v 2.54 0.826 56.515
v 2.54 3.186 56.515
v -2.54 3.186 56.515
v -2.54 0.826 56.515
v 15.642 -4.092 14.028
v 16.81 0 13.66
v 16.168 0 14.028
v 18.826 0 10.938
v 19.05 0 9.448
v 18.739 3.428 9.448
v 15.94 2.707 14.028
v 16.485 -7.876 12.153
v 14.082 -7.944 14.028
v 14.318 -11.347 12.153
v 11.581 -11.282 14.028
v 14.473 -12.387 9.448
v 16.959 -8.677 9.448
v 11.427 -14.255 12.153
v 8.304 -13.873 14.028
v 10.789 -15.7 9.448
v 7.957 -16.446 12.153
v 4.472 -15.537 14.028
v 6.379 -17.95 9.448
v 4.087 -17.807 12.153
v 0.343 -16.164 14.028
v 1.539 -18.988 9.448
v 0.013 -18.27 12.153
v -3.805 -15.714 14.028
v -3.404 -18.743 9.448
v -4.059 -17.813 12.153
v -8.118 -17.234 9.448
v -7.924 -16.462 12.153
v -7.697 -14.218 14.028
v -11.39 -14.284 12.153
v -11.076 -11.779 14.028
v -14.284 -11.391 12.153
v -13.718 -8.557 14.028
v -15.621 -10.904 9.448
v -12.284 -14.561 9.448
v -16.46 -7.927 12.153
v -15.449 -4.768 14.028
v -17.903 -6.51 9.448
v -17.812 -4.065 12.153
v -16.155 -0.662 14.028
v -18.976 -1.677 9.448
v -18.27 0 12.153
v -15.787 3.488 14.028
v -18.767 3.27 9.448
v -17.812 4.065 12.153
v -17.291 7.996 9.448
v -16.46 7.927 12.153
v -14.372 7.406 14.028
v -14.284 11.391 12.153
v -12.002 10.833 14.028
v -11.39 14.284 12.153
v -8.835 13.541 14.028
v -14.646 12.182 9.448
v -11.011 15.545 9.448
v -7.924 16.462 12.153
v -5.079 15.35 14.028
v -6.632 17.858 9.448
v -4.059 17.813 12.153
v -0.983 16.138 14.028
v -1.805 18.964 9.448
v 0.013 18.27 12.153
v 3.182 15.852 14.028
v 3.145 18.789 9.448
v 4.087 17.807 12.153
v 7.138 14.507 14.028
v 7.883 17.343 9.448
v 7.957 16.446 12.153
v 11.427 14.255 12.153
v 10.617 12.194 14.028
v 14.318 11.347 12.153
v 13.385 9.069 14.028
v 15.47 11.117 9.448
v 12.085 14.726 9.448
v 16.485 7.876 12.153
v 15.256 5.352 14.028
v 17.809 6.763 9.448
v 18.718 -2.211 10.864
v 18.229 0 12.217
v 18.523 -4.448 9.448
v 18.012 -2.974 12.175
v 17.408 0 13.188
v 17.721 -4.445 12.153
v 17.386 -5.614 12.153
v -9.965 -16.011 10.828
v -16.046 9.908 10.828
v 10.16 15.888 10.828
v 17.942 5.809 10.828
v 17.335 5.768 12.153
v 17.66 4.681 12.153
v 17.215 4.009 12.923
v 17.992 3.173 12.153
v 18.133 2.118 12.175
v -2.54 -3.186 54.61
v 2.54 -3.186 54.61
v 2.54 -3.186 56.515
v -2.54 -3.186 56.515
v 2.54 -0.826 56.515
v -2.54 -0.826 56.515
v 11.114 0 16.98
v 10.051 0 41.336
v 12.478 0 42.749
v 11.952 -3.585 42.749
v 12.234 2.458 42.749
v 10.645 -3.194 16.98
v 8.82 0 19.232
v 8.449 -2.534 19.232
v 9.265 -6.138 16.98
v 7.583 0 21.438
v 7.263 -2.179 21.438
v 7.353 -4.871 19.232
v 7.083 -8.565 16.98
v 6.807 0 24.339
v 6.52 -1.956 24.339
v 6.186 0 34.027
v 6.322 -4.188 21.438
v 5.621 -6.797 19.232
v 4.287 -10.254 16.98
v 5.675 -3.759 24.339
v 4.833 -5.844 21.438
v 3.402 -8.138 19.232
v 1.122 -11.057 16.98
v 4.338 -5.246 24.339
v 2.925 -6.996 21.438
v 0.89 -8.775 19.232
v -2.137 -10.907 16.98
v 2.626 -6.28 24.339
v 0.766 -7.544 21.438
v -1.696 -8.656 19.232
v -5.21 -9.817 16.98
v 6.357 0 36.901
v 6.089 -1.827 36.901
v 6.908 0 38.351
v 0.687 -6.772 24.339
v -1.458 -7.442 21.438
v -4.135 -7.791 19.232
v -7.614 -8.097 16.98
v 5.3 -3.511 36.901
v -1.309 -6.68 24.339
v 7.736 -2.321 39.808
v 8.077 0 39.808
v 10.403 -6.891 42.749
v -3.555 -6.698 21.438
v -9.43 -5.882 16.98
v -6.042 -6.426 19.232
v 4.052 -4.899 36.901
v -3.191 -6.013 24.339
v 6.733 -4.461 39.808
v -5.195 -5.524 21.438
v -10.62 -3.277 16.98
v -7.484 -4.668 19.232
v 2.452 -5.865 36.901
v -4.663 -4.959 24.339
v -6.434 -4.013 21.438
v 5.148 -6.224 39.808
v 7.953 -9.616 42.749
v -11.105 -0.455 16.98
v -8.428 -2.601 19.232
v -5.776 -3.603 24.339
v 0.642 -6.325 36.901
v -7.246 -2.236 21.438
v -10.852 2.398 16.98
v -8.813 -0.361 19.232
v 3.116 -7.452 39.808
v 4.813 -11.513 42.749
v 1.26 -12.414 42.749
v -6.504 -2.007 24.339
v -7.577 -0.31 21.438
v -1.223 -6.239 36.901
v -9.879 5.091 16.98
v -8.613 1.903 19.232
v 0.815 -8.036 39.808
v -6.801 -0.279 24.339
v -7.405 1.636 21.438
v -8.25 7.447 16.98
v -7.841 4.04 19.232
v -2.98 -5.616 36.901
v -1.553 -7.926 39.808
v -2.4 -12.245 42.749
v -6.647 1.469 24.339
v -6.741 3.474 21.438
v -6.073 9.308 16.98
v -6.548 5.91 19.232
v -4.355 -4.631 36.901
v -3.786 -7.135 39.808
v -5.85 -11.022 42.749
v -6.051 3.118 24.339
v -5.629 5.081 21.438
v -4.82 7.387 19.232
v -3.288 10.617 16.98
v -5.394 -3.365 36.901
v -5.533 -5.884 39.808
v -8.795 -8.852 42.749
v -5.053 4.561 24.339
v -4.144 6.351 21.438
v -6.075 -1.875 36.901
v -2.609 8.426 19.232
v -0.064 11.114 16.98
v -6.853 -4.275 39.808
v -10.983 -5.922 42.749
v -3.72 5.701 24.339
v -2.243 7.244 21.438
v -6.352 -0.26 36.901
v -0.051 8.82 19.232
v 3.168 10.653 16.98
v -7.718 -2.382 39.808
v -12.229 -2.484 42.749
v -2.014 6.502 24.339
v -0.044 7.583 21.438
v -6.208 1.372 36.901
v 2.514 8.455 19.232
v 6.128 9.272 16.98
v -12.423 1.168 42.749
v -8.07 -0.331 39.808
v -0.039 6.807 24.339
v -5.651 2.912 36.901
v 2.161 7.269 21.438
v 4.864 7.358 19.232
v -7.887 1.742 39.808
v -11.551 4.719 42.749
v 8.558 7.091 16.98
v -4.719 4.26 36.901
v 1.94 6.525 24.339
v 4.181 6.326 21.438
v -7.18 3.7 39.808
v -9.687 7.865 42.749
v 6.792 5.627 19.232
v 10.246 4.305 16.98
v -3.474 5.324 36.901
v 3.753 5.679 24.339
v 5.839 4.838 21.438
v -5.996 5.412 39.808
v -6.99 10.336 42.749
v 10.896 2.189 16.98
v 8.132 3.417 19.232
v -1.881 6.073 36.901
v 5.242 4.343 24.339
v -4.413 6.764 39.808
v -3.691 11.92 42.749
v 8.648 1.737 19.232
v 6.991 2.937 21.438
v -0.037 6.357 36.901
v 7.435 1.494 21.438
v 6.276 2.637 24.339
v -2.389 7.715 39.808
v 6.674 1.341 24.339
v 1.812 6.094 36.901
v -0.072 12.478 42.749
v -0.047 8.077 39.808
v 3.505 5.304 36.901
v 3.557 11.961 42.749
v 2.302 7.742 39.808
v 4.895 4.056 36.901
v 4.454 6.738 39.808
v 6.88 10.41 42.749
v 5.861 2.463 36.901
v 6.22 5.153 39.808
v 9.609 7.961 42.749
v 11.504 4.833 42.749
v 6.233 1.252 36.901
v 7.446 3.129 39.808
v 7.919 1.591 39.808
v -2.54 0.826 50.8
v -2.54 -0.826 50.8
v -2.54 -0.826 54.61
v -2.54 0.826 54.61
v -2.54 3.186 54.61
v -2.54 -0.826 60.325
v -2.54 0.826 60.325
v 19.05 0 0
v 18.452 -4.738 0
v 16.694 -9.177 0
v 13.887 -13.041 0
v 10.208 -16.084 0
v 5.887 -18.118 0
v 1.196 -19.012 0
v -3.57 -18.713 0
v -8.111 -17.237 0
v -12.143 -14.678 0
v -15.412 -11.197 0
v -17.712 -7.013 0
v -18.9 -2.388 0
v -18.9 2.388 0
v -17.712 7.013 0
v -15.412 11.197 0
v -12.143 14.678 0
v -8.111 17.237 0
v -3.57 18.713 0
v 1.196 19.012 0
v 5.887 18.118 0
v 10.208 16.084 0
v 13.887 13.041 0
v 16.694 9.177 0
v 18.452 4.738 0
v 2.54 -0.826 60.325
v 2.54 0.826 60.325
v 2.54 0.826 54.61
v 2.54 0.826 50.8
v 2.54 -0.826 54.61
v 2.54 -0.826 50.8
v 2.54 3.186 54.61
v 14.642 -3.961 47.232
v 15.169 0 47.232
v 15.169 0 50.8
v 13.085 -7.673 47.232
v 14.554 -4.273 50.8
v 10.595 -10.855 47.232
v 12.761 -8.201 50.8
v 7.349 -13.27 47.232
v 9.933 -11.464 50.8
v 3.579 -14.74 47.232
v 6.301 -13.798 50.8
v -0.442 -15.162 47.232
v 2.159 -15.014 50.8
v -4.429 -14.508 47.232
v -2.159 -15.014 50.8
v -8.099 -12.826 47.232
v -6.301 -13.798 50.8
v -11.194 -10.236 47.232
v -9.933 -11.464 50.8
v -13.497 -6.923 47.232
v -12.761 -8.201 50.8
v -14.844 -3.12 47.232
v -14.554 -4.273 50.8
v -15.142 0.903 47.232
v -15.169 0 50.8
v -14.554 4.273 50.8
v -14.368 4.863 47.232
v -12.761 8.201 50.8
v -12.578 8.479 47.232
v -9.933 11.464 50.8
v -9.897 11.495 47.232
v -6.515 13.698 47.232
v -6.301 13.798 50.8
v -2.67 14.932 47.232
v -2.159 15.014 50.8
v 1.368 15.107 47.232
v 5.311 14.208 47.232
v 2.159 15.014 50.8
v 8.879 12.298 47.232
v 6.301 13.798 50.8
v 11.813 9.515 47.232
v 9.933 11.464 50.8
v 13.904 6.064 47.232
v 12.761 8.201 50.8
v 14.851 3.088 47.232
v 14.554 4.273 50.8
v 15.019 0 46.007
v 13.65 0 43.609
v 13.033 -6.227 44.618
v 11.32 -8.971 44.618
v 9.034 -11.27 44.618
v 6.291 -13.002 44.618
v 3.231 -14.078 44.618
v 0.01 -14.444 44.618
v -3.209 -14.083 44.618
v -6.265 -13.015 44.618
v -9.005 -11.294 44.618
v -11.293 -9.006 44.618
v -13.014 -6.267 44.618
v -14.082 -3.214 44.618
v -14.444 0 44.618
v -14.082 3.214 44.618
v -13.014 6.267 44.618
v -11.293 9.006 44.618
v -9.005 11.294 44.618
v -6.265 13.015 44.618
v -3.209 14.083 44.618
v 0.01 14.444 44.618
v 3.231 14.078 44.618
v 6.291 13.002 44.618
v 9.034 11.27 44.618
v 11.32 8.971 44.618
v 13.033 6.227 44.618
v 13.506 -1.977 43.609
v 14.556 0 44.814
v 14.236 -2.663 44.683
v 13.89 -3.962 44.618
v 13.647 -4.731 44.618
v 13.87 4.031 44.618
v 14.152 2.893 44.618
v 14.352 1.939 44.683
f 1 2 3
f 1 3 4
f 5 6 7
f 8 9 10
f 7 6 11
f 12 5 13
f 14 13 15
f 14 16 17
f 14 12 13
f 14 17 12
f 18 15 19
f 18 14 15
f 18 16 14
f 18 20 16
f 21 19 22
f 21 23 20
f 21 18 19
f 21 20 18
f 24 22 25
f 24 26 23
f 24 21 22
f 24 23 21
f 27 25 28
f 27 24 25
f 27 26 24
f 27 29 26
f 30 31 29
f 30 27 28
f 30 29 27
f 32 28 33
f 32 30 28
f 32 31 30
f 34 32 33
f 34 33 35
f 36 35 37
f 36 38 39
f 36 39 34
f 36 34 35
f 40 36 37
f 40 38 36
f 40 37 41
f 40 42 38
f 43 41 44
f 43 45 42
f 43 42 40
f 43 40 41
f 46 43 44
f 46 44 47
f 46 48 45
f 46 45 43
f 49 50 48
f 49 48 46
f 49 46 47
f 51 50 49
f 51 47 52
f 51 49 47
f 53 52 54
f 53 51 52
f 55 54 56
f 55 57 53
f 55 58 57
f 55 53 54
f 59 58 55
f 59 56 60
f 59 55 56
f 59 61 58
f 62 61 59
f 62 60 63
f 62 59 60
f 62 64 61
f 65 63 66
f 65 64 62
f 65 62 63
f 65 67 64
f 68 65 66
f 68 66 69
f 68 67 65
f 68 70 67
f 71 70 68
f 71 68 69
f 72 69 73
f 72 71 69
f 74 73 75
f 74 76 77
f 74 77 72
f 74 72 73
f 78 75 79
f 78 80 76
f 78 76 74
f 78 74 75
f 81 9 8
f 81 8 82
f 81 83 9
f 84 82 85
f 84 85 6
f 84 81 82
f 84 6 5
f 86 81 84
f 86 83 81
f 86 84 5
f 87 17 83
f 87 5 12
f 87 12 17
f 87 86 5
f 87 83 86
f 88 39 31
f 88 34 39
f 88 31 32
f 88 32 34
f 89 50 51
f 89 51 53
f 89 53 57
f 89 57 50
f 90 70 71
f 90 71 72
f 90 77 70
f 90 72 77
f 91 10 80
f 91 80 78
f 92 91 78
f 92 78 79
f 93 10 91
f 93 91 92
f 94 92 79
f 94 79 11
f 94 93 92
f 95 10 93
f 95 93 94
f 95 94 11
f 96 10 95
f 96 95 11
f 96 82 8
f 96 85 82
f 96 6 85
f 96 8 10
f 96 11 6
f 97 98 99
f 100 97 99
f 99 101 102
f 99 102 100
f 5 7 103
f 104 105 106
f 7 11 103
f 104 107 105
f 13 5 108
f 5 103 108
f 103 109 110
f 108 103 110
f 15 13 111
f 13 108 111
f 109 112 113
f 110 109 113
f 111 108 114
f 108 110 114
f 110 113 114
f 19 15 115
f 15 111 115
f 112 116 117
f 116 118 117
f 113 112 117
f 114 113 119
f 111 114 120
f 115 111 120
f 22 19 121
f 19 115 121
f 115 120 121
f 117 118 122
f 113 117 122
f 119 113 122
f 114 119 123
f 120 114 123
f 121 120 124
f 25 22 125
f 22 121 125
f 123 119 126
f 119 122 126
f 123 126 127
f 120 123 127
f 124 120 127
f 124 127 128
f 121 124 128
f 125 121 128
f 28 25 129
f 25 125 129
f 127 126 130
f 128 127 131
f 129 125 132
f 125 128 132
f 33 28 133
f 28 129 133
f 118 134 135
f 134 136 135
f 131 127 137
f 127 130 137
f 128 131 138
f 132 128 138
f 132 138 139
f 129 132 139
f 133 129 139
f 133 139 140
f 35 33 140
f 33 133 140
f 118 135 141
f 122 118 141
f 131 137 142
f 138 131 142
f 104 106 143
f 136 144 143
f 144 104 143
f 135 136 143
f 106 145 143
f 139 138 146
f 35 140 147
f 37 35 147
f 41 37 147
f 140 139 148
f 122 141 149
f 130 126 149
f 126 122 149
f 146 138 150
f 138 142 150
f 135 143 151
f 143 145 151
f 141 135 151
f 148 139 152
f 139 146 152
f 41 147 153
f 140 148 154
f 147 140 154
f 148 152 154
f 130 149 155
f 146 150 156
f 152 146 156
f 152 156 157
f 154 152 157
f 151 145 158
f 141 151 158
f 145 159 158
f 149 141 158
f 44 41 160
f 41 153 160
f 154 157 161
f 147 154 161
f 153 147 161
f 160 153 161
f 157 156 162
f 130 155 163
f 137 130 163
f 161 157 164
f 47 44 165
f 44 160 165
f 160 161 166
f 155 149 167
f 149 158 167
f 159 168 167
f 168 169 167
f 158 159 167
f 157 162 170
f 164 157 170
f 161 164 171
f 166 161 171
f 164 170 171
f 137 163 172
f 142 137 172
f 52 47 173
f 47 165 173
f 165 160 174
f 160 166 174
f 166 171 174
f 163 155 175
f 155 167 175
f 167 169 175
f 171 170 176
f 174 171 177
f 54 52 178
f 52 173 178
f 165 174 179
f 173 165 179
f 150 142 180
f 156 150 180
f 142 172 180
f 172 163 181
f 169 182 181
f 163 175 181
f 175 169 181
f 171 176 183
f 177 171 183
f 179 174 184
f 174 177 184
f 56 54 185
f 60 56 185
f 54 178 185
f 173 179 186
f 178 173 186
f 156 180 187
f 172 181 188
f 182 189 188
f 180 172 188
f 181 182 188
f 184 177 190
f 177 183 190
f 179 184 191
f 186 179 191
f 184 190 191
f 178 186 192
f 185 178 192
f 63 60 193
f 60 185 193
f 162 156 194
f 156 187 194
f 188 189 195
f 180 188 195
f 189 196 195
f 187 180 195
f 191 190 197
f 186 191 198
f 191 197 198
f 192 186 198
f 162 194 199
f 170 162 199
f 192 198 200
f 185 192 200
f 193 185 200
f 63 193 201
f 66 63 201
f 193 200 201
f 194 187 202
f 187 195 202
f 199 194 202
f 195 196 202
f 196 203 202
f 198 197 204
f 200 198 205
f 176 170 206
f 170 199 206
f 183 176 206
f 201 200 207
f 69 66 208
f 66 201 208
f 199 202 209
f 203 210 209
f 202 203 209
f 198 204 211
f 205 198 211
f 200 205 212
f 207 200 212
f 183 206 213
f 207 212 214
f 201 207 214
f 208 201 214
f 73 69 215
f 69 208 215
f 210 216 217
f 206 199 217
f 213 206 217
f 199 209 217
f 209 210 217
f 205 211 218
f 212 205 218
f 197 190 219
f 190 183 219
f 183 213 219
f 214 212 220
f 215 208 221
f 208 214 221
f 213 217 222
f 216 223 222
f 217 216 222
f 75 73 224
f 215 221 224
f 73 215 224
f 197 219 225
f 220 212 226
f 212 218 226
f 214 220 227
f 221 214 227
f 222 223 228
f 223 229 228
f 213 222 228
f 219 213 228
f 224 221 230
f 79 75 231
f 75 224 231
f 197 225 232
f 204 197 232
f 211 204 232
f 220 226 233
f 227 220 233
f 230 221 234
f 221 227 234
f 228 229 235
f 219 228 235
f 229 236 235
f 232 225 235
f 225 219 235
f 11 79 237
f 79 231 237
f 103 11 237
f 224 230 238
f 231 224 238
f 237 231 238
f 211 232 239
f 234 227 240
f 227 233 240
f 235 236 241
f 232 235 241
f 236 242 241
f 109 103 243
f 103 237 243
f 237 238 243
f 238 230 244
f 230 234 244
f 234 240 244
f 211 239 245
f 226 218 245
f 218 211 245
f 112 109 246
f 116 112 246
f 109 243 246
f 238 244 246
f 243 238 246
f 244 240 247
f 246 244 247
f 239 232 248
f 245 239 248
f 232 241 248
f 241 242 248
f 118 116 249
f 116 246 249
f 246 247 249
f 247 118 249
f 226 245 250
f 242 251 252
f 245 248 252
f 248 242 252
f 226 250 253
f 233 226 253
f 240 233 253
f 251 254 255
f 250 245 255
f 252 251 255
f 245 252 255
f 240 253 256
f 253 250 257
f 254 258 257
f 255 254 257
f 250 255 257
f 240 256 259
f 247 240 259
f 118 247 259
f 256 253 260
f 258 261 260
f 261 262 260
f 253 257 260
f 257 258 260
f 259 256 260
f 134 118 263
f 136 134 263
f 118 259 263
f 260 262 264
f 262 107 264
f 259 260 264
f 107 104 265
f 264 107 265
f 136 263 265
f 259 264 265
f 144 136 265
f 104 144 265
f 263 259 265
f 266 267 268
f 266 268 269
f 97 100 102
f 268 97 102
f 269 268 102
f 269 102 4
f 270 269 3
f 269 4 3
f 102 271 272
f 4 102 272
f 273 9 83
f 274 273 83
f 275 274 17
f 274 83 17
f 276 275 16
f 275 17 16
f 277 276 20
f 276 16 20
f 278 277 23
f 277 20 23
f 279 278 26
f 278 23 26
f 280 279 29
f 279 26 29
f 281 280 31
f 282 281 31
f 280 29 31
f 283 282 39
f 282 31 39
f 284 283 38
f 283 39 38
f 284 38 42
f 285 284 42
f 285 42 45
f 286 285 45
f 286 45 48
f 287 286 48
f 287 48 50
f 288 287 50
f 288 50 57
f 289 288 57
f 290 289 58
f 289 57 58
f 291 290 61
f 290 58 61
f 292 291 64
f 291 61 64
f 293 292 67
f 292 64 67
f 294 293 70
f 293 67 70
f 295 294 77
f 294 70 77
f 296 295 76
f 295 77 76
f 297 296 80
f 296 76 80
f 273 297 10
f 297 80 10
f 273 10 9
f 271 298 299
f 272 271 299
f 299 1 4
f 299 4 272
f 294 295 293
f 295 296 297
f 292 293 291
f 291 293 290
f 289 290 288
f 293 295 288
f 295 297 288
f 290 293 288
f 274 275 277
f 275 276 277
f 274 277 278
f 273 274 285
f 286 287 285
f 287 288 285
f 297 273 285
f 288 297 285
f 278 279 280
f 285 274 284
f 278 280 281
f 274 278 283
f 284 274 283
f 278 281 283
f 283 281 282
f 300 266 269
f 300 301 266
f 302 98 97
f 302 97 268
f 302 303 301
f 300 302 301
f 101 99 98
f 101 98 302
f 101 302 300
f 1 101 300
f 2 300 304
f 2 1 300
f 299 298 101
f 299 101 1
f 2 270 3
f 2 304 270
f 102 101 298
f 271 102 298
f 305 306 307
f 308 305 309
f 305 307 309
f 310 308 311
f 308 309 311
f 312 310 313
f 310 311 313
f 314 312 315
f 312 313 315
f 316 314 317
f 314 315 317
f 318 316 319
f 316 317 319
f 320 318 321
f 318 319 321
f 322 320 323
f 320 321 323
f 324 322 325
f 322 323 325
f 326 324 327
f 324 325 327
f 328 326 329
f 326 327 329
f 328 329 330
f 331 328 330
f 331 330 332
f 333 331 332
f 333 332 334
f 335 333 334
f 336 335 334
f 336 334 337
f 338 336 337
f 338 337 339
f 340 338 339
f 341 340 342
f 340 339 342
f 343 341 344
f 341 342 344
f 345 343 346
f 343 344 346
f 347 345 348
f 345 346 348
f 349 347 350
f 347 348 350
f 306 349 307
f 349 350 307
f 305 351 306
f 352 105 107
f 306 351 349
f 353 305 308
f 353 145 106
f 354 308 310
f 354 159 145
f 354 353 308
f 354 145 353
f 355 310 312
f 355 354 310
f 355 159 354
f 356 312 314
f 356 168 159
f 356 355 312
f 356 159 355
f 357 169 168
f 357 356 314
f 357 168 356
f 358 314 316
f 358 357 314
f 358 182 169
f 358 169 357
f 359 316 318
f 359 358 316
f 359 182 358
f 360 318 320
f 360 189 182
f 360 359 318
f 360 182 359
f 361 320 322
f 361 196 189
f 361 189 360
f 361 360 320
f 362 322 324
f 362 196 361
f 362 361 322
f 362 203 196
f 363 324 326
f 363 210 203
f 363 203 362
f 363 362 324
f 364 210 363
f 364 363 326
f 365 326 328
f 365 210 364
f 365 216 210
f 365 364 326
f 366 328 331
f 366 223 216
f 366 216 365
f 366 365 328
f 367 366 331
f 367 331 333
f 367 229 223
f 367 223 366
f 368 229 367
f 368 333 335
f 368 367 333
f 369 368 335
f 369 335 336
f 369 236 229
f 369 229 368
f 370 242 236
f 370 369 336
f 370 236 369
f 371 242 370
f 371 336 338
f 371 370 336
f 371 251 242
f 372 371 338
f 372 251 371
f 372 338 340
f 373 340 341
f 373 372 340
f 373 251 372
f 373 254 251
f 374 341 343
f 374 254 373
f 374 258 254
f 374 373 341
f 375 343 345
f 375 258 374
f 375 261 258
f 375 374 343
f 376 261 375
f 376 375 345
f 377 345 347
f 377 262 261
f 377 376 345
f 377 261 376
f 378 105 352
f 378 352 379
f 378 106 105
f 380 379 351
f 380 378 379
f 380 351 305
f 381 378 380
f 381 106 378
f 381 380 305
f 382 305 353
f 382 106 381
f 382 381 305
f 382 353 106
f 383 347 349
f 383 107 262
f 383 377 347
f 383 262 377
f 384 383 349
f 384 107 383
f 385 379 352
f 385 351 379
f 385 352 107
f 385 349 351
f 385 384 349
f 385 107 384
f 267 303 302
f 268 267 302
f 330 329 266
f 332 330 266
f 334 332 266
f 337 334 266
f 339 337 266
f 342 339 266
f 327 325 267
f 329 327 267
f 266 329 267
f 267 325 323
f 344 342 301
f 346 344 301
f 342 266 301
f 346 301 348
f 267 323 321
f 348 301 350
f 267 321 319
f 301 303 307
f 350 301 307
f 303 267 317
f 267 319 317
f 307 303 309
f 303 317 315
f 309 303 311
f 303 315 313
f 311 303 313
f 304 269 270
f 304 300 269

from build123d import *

# Parameters (mm, degrees)
F2_R          = 5.08
F3_W          = 2.3605417221
F3_H          = 1.905
F3_W_2        = 1.651
F3_H_2        = 3.81
F4_DEPTH      = 2.54
F4_DEPTH_BACK = 2.54


with BuildPart() as f1:
    # F0 (on Front) → F1 (revolve)
    with BuildSketch(Plane.XZ):
        with BuildLine():
            Line((0, 50.8), (0, 0))
            Line((0, 0), (19.05, 0))
            Line((19.05, 0), (19.05, 12.7))
            add(Edge.make_bspline(
                [(19.05, 12.7), (14.6501975513, 14.6853360604), (6.1281189575, 18.5307791547), (6.6413755909, 31.399715349), (5.422508764, 39.255582621), (11.7317588055, 42.4059519263), (15.1685345918, 44.1220216453)],
                knots=[0, 0, 0, 0, 0.2826478816, 0.547467185, 0.7534962459, 1, 1, 1, 1], degree=3))
            Line((15.1685345918, 44.1220216453), (15.1685345918, 50.8))
            Line((15.1685345918, 50.8), (0, 50.8))
        make_face()
    revolve(axis=Axis((0, 0, 25.4), (0, 0, -1)))

    # F2
    f2_edges = [f1.edges().sort_by_distance(p)[0] for p in [
        (-19.05, 0, 12.7),
        (-15.168535, 0, 44.122022),
    ]]
    fillet(f2_edges, radius=F2_R)

    # F3 (on Right) → F4 (join, two sides)
    with BuildSketch(Plane.YZ) as f4_sk:
        with Locations((2.005770861, 55.5625)):
            Rectangle(F3_W, F3_H)
        with Locations((0, 55.5625)):
            Rectangle(F3_W_2, F3_H)
        with Locations((-2.005770861, 55.5625)):
            Rectangle(F3_W, F3_H)
        with Locations((0, 58.42)):
            Rectangle(F3_W_2, F3_H_2)
        with Locations((0, 52.705)):
            Rectangle(F3_W_2, F3_H_2)
    extrude(amount=F4_DEPTH)
    extrude(f4_sk.sketch, amount=-F4_DEPTH_BACK)


solid = f1.part
